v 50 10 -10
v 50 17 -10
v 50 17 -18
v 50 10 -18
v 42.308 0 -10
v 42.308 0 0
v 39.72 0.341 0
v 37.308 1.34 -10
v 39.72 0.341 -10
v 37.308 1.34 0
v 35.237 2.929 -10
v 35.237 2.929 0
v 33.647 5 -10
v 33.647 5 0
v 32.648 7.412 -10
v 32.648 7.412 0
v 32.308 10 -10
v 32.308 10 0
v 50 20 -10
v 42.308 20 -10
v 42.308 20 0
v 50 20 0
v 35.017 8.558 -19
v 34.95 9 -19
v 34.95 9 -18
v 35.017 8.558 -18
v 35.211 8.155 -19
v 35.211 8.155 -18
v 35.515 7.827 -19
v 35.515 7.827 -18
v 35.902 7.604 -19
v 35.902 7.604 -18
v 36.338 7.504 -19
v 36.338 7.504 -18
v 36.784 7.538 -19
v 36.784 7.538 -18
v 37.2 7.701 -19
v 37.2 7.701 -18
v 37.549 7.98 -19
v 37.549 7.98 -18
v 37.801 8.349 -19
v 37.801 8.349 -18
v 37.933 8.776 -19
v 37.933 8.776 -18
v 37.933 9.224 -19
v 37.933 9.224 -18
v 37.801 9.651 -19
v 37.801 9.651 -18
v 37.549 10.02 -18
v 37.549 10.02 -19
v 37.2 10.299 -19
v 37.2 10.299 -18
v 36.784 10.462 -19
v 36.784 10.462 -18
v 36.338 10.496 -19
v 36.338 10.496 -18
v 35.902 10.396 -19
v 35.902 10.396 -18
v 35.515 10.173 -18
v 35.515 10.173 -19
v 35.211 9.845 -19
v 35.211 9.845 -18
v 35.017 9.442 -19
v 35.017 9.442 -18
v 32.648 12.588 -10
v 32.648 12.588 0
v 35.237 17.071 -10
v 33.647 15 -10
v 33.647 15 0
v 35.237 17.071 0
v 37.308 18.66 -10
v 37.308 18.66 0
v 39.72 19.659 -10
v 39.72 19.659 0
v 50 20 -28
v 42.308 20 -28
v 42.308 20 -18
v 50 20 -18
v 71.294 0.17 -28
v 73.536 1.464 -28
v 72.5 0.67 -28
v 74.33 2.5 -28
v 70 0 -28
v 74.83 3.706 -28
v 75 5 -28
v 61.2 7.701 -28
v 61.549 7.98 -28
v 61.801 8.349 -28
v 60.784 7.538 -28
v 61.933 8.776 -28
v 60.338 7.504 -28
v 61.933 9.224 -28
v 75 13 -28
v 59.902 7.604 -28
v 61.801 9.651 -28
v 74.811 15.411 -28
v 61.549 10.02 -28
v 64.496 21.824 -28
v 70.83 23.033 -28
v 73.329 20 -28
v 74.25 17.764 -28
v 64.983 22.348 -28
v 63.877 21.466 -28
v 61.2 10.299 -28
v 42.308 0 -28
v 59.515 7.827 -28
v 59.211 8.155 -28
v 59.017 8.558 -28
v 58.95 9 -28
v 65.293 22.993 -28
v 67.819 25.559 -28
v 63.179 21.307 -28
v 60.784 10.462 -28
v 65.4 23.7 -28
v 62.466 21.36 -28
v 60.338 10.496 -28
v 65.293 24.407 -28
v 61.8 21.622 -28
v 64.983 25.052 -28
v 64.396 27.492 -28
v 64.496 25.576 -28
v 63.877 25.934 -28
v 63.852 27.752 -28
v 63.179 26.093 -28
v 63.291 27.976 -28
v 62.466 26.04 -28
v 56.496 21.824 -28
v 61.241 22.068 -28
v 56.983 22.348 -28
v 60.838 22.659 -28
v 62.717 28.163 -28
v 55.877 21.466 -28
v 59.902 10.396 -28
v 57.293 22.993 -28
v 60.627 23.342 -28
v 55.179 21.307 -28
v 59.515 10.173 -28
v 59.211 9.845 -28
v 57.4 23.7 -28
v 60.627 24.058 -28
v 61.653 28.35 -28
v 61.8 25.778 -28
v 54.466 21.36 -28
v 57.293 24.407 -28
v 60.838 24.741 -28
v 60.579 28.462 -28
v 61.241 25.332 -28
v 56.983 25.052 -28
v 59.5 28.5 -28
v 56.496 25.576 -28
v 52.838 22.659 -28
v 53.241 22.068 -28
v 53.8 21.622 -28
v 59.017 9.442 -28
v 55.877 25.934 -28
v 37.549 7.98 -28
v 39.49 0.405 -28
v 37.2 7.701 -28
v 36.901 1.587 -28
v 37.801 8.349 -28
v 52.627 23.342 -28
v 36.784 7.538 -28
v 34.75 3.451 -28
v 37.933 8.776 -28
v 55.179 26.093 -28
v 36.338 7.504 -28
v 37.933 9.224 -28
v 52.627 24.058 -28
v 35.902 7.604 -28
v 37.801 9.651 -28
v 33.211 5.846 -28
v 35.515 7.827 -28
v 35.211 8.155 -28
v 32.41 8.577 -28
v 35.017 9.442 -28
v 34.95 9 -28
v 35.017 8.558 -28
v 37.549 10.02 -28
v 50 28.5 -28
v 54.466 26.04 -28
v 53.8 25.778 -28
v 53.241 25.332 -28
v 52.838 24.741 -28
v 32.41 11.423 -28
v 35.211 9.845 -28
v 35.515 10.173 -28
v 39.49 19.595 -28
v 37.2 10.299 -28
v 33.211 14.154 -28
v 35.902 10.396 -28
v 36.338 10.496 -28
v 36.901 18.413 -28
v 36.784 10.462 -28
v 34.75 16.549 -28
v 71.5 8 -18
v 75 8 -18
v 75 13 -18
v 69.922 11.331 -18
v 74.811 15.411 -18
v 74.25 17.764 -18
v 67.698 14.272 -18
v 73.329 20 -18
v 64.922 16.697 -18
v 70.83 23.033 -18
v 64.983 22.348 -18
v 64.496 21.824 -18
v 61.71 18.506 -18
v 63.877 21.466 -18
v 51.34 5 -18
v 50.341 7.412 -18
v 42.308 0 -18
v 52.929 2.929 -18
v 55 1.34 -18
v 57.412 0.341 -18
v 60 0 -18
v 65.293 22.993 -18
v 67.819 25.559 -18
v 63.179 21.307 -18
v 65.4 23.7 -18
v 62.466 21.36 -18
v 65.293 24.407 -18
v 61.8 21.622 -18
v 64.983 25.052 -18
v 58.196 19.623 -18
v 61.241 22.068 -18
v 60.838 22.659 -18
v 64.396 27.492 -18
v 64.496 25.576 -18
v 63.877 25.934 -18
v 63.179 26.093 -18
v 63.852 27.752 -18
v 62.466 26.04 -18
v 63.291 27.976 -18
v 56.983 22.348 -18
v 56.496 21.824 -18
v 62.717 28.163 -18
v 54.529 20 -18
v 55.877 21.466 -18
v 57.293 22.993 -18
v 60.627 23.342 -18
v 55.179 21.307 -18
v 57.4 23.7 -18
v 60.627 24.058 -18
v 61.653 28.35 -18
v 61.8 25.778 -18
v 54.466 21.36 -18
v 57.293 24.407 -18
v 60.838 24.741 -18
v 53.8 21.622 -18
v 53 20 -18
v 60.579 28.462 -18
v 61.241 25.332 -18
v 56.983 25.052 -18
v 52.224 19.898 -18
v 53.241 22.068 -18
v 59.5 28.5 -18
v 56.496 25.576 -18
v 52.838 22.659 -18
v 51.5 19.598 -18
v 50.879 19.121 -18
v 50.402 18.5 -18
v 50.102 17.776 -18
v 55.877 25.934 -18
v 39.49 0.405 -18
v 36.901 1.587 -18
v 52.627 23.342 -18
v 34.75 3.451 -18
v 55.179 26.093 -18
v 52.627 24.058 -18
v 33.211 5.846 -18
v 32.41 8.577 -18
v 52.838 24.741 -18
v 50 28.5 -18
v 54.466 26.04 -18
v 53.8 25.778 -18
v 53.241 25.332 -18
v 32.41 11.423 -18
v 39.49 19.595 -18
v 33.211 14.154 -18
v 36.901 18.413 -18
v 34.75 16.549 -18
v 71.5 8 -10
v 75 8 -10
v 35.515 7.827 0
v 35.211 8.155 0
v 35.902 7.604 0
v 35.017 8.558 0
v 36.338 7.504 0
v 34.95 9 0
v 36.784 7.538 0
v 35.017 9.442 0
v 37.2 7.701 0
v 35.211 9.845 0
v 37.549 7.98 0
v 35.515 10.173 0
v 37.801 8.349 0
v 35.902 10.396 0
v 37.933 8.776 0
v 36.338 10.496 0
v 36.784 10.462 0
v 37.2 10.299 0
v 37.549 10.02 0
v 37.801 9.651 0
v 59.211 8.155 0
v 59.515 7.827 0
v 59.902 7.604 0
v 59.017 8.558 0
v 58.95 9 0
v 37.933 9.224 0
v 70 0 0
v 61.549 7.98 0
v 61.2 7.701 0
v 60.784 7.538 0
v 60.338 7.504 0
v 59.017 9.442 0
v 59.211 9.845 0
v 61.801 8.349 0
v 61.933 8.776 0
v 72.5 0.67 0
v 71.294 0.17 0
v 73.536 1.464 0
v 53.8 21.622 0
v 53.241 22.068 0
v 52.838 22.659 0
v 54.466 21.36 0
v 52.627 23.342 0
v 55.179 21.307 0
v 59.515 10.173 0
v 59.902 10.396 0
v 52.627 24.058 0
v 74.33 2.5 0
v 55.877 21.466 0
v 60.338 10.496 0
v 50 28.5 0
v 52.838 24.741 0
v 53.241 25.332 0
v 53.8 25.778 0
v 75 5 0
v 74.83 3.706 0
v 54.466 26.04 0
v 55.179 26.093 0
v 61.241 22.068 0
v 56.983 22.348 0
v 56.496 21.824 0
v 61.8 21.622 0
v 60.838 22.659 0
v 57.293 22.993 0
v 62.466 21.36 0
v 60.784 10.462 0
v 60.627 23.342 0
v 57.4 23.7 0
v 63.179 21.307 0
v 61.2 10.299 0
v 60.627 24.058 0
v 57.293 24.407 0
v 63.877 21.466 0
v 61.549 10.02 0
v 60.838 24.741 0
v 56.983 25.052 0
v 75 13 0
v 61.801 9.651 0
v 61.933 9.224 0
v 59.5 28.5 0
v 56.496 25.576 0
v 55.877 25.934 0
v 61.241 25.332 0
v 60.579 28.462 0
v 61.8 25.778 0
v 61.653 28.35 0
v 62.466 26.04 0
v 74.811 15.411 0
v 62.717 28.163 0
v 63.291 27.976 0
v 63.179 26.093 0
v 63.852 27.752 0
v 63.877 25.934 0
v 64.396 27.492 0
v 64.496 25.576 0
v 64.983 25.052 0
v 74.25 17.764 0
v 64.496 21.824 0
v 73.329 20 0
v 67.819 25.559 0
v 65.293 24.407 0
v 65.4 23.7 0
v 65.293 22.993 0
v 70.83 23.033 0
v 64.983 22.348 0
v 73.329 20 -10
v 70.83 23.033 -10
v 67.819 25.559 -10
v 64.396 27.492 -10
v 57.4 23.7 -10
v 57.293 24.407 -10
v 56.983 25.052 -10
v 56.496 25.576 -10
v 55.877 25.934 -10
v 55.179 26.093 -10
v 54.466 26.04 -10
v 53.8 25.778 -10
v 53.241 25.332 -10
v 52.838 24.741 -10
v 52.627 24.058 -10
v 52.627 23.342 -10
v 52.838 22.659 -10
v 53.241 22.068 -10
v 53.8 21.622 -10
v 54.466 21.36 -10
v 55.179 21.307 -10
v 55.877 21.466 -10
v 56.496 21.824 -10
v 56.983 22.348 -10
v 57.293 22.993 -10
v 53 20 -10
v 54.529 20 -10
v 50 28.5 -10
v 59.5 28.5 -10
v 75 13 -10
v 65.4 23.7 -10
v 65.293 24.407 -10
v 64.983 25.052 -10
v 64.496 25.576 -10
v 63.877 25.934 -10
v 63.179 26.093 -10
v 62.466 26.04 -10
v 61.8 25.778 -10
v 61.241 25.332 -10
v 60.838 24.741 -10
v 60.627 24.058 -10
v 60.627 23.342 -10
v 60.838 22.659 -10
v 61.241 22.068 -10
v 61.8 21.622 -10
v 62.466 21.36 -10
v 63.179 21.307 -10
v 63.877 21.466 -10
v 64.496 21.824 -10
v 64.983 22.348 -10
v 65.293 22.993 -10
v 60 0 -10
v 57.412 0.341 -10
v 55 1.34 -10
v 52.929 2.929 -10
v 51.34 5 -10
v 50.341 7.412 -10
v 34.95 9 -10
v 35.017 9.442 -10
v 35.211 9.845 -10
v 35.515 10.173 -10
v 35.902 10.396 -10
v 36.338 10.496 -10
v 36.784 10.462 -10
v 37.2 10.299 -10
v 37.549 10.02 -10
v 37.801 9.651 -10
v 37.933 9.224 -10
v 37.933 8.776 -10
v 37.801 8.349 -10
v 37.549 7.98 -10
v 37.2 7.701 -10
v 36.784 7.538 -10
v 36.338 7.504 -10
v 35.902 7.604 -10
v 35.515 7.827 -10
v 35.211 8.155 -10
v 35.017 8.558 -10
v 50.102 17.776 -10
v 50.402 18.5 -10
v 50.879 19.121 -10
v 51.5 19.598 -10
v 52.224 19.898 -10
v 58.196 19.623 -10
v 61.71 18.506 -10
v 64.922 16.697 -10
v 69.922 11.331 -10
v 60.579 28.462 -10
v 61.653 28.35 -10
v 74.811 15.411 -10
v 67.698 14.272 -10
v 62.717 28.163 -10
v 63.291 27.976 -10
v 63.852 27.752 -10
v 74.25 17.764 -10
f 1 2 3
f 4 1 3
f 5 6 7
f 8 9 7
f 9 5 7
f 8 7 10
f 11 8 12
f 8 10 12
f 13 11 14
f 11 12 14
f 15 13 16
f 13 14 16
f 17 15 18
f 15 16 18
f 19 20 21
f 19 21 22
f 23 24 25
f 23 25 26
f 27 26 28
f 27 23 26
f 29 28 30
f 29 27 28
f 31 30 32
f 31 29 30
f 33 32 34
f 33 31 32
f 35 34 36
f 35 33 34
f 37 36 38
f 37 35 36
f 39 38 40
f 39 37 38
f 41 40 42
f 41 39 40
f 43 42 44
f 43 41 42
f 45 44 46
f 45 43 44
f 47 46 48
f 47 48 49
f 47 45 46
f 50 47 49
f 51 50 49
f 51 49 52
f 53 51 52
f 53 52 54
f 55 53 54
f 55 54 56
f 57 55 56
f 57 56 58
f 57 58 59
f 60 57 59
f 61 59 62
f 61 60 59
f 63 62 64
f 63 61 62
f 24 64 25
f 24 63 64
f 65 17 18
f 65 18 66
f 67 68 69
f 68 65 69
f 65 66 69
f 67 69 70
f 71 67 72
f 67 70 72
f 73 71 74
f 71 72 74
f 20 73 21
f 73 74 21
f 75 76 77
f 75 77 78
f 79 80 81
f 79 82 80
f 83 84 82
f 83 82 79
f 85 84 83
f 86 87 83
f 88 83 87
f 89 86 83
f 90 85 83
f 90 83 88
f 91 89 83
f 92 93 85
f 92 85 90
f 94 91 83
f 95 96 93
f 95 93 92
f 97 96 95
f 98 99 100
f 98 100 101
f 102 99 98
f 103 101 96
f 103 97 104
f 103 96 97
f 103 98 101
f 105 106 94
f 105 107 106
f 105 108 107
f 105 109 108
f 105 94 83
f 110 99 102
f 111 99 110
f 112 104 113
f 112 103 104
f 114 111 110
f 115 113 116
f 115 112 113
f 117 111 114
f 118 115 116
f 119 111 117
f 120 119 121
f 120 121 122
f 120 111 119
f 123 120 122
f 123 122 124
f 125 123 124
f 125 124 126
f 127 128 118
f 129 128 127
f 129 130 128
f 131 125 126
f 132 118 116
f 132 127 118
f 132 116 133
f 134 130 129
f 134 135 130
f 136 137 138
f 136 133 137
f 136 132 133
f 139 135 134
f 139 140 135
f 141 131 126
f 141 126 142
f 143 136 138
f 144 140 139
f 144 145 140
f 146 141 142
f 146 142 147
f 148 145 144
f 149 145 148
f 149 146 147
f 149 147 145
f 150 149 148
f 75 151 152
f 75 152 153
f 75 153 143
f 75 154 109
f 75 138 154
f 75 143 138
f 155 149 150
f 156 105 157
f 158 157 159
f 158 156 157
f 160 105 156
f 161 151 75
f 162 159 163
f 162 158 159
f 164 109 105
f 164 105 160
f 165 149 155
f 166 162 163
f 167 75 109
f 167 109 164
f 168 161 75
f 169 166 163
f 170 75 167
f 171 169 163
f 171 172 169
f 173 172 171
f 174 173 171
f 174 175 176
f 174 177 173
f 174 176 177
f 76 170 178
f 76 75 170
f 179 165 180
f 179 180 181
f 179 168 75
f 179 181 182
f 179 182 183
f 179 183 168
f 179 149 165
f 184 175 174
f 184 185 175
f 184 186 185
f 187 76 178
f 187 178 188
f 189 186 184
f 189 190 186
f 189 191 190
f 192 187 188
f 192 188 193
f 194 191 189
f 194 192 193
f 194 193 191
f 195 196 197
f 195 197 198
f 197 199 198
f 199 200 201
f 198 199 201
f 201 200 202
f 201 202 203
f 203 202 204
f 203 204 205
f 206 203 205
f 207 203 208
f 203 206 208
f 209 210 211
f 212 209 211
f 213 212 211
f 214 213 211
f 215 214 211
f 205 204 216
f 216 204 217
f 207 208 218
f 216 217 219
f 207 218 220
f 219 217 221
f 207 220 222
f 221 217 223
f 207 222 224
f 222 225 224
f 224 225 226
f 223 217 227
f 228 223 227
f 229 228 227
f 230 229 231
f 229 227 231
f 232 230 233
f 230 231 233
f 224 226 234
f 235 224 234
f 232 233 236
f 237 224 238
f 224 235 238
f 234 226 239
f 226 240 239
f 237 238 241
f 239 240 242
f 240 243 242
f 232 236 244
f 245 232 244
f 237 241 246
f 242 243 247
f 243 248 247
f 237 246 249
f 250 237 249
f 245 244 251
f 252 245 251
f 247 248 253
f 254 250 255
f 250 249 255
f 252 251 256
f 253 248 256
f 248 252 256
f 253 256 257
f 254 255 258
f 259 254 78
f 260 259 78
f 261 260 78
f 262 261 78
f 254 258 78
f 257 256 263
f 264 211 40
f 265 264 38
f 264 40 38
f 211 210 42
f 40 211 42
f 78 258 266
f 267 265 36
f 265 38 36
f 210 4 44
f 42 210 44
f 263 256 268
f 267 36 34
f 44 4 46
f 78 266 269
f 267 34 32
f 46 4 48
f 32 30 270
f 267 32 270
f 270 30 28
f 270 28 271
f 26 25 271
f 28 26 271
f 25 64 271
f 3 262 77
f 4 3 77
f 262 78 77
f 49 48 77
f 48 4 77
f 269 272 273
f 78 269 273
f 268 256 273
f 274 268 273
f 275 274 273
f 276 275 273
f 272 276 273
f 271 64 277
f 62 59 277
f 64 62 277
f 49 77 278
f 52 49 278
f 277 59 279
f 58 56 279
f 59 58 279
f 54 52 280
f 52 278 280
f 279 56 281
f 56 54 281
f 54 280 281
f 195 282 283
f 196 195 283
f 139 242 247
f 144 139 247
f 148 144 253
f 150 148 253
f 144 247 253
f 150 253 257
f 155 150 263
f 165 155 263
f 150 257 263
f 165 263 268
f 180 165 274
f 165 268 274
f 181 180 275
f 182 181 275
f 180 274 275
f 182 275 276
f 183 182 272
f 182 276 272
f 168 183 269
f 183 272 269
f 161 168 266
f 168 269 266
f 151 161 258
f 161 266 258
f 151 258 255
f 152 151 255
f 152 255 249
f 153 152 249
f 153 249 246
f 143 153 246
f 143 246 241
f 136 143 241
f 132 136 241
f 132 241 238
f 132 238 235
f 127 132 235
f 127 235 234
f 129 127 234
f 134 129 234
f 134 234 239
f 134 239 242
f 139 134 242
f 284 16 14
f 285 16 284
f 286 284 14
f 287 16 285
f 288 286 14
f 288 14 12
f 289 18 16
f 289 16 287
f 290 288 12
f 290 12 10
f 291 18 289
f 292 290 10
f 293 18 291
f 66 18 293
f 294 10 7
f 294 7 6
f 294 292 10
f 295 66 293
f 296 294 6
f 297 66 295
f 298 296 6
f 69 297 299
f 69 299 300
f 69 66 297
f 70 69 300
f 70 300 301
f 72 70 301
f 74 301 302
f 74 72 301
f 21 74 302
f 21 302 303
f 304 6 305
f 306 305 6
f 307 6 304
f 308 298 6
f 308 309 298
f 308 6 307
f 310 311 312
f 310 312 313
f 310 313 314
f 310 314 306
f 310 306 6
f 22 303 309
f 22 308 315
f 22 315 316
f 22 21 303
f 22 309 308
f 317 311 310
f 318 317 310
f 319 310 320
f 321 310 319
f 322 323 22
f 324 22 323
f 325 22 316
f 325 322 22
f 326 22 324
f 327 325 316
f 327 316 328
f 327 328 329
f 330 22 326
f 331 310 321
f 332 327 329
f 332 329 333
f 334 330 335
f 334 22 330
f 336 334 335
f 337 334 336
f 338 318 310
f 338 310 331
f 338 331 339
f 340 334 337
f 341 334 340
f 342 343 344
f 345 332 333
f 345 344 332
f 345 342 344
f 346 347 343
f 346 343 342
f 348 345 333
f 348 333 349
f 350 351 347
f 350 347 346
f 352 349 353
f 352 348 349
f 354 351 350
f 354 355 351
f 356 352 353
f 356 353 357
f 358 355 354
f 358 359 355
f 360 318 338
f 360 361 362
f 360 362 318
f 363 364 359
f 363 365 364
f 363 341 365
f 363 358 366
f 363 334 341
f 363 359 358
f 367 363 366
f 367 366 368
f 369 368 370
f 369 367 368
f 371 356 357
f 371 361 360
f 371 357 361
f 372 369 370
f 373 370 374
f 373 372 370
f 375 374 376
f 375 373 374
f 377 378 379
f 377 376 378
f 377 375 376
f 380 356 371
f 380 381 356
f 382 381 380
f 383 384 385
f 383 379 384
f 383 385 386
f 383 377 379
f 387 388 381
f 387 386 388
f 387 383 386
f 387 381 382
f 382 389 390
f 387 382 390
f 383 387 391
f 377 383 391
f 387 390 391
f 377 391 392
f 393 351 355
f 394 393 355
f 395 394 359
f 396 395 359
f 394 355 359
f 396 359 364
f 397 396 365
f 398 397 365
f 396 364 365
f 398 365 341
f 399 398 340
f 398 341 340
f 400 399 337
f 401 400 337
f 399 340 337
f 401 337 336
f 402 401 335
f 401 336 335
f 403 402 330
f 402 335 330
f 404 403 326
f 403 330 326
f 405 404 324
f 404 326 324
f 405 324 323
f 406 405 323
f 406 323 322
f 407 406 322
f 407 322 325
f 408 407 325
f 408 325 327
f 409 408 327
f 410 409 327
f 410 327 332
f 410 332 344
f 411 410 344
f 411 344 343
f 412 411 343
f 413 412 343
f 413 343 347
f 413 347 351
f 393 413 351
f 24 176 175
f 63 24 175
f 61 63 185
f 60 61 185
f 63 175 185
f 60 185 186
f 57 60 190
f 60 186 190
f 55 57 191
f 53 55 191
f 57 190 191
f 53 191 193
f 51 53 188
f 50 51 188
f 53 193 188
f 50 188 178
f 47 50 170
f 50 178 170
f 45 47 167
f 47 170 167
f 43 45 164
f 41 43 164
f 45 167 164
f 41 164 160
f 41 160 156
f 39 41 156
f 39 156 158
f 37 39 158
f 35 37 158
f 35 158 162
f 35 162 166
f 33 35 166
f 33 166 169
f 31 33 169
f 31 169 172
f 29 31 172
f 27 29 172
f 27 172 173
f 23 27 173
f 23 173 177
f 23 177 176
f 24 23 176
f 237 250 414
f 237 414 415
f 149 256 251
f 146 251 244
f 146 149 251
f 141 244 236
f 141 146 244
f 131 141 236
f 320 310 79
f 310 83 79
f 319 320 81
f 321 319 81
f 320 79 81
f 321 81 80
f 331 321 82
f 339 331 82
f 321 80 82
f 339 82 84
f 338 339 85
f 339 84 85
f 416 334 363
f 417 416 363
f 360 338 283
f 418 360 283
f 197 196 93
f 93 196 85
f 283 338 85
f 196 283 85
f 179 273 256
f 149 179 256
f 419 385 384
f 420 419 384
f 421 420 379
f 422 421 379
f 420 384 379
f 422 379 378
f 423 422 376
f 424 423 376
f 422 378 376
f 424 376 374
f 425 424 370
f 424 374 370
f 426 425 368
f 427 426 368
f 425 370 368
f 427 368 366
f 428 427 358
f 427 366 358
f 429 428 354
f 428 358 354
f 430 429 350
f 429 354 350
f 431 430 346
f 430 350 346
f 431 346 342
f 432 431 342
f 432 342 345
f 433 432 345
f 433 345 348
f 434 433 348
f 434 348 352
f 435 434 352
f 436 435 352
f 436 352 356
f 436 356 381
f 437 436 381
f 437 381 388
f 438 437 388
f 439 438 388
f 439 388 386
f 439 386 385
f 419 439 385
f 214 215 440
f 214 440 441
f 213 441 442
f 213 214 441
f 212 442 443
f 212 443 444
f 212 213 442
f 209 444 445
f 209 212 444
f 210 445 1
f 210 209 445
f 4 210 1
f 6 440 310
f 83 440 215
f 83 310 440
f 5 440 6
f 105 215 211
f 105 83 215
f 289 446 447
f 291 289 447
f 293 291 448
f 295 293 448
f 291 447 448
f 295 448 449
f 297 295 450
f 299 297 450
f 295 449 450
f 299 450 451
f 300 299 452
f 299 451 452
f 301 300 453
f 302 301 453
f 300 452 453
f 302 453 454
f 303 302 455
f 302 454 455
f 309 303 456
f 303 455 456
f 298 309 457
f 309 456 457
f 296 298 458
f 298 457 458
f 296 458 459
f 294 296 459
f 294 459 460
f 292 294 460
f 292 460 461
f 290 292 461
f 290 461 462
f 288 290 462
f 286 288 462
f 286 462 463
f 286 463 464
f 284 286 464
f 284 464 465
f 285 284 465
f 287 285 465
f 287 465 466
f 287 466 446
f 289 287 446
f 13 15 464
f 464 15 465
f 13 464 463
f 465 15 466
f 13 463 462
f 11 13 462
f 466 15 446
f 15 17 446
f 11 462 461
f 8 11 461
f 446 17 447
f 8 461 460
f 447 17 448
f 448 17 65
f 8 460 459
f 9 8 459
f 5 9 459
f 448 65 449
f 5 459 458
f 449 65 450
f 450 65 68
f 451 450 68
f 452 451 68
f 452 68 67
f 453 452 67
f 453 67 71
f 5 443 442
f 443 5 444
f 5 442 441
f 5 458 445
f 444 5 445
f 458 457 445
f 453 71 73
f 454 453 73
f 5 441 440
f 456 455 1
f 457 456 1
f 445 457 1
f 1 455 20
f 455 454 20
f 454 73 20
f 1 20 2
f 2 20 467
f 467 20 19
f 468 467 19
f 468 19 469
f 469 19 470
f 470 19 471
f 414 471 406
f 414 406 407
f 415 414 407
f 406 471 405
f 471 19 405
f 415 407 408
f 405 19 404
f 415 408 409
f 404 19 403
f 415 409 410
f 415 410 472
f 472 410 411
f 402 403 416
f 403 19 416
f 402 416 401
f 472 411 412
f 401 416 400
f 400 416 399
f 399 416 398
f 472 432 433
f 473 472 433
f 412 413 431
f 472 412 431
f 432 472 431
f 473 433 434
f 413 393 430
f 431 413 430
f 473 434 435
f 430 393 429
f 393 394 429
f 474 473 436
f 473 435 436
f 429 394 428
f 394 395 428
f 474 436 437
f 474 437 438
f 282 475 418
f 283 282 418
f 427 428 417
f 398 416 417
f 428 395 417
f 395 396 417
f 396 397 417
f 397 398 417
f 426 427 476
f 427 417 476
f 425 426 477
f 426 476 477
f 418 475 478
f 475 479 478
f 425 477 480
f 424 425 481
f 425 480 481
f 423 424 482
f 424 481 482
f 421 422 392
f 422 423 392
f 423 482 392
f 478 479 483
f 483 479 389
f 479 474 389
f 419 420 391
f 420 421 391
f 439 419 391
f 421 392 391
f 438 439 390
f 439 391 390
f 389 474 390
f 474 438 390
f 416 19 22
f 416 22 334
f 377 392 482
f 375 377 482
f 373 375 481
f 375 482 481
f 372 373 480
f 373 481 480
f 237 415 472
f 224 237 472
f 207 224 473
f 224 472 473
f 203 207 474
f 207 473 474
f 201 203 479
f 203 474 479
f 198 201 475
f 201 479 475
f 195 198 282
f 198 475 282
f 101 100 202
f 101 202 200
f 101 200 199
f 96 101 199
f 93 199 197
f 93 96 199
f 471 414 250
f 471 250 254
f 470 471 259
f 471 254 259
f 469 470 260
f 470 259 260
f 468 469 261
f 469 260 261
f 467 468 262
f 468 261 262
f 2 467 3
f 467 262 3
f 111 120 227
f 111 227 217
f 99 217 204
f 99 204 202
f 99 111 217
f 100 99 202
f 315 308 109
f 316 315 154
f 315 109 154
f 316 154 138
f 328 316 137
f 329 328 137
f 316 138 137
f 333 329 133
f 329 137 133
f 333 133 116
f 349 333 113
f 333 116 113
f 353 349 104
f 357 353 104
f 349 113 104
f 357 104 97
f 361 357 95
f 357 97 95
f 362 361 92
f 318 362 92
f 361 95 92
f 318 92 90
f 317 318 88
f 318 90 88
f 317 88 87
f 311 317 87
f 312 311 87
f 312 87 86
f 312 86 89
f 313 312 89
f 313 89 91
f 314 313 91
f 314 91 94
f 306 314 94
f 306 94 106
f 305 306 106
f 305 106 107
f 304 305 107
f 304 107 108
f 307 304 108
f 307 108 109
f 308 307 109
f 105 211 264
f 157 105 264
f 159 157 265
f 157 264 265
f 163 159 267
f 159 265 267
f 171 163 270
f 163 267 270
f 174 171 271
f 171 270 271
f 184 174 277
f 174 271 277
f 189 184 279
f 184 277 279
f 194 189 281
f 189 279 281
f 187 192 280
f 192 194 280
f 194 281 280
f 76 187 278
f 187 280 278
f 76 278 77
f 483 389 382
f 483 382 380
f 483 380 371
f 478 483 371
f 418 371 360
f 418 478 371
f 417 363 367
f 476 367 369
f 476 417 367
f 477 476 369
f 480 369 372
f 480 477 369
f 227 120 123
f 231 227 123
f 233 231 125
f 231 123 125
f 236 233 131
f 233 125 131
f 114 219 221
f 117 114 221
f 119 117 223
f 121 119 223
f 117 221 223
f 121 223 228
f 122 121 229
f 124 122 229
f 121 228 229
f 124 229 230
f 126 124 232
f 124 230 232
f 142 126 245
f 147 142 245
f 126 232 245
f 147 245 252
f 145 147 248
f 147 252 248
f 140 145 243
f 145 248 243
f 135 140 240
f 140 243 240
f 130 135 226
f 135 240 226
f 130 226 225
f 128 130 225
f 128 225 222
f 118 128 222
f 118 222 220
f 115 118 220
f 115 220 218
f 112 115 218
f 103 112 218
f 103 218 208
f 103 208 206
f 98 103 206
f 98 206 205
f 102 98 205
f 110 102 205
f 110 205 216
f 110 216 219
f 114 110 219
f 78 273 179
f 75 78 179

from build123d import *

# Parameters (mm, degrees)
CROQUIS1_W                 = 75
CROQUIS1_H                 = 28
SALIENTE_EXTRUIR2_DEPTH    = 20
CROQUIS2_W                 = 75
CROQUIS2_H                 = 10
SALIENTE_EXTRUIR3_DEPTH    = 8.5
CROQUIS3_R                 = 2.4
CORTAR_EXTRUIR1_DEPTH      = 28
CROQUIS5_W                 = 3.5
CROQUIS5_H                 = 8
CORTAR_EXTRUIR2_DEPTH      = 12
REDONDEO1_R                = 18
CORTAR_EXTRUIR3_DEPTH      = 18.5
CORTAR_EXTRUIR3_DEPTH_BACK = 9.5
CROQUIS7_W                 = 50
CROQUIS7_H                 = 8.5
CROQUIS8_W                 = 50
CROQUIS8_H                 = 9
CORTAR_EXTRUIR4_DEPTH      = 20.5
REDONDEO2_R                = 10
REDONDEO5_R                = 10
CORTAR_EXTRUIR6_DEPTH      = 28.5
CROQUIS10_R                = 1.5
CORTAR_EXTRUIR7_DEPTH      = 85.977938313
REDONDEO6_R                = 10
REDONDEO7_R                = 3
REDONDEO8_R                = 5
CORTAR_EXTRUIR11_DEPTH     = 85.977938313
SALIENTE_EXTRUIR4_DEPTH    = 10
SALIENTE_EXTRUIR5_START    = -10
SALIENTE_EXTRUIR5_DEPTH    = 10
CORTAR_EXTRUIR12_START     = -0.5
CORTAR_EXTRUIR12_DEPTH     = 0.5
CROQUIS20_R                = 1.5
SALIENTE_EXTRUIR7_DEPTH    = 1
CORTAR_EXTRUIR13_DEPTH     = 85.977938313
CORTAR_EXTRUIR14_DEPTH     = 85.977938313
REDONDEO9_R                = 10


with BuildPart() as part:
    # Croquis1 → Saliente-Extruir2 (new body)
    with BuildSketch(Plane(origin=(0, 0, 0), x_dir=(1, 0, 0), z_dir=(0, 1, 0))):
        with Locations((37.5, 14)):
            Rectangle(CROQUIS1_W, CROQUIS1_H)
    extrude(amount=SALIENTE_EXTRUIR2_DEPTH)

    # Croquis2 → Saliente-Extruir3 (add)
    with BuildSketch(Plane(origin=(0, 20, 0), x_dir=(1, 0, 0), z_dir=(0, 1, 0))):
        with Locations((37.5, 5)):
            Rectangle(CROQUIS2_W, CROQUIS2_H)
        with Locations((37.5, 23)):
            Rectangle(CROQUIS2_W, CROQUIS2_H)
    extrude(amount=SALIENTE_EXTRUIR3_DEPTH)

    # Croquis3 → Cortar-Extruir1 (cut)
    with BuildSketch(Plane.XY):
        with Locations((63, 23.7)):
            Circle(CROQUIS3_R)
        with Locations((55, 23.7)):
            Circle(CROQUIS3_R)
    extrude(amount=-CORTAR_EXTRUIR1_DEPTH, mode=Mode.SUBTRACT)

    # Croquis5 → Cortar-Extruir2 (cut)
    with BuildSketch(Plane(origin=(0, 20, 0), x_dir=(1, 0, 0), z_dir=(0, 1, 0))):
        with Locations((73.25, 14)):
            Rectangle(CROQUIS5_W, CROQUIS5_H)
    extrude(amount=-CORTAR_EXTRUIR2_DEPTH, mode=Mode.SUBTRACT)

    # Redondeo1
    # the kernel refuses this fillet: 18 mm, written as the material it takes off along each edge
    with BuildSketch(Plane(origin=(71.5, 20, -10), x_dir=(0, -1, 0), z_dir=(0, 0, -1))) as redondeo1_piece_1:
        with BuildLine():
            CenterArc((18, 16.970562748), REDONDEO1_R, 180, 70.528779366)
            Line((0, 16.970562748), (0, 0))
            Line((0, 0), (12, 0))
        make_face()
    extrude(amount=8, mode=Mode.SUBTRACT)

    # Croquis7 → Cortar-Extruir3 (cut, two sides: drawn at the far end of the back side and taken through both)
    with BuildSketch(Plane.XY.offset(-18).offset(-CORTAR_EXTRUIR3_DEPTH_BACK)):
        with Locations((25, 24.25)):
            Rectangle(CROQUIS7_W, CROQUIS7_H)
    extrude(amount=CORTAR_EXTRUIR3_DEPTH + CORTAR_EXTRUIR3_DEPTH_BACK, mode=Mode.SUBTRACT)

    # Croquis8 → Cortar-Extruir4 (cut)
    with BuildSketch(Plane(origin=(0, 20, 0), x_dir=(1, 0, 0), z_dir=(0, 1, 0))):
        with Locations((25, 14.5)):
            Rectangle(CROQUIS8_W, CROQUIS8_H)
    extrude(amount=-CORTAR_EXTRUIR4_DEPTH, mode=Mode.SUBTRACT)

    # Redondeo2
    redondeo2_edges = [part.edges().sort_by_distance(p)[0] for p in [
        (0, 20, -5),
        (0, 20, -23.25),
    ]]
    fillet(redondeo2_edges, radius=REDONDEO2_R)

    # Redondeo5
    # the kernel refuses this fillet: 10 mm, written as the material it takes off along each edge
    with BuildSketch(Plane(origin=(0, 0, -35), x_dir=(1, 0, 0), z_dir=(0, 0, 1))) as redondeo5_piece_1:
        with BuildLine():
            CenterArc((REDONDEO5_R, REDONDEO5_R), REDONDEO5_R, 180, 90)
            Line((0, REDONDEO5_R), (0, 0))
            Line((0, 0), (REDONDEO5_R, 0))
        make_face()
    extrude(amount=60, mode=Mode.SUBTRACT)

    # Croquis9 → Cortar-Extruir6 (cut)
    with BuildSketch(Plane(origin=(0, 0, -28), x_dir=(-1, 0, 0), z_dir=(0, 0, -1))):
        with BuildLine():
            Line((-75, 28.5), (-59.5, 28.5))
            ThreePointArc((-59.5, 28.5), (-70.460155108, 23.960155108), (-75, 13))
            Line((-75, 13), (-75, 28.5))
        make_face()
    extrude(amount=-CORTAR_EXTRUIR6_DEPTH, mode=Mode.SUBTRACT)

    # Croquis10 → Cortar-Extruir7 (cut, through all)
    with BuildSketch(Plane(origin=(0, 0, -28), x_dir=(-1, 0, 0), z_dir=(0, 0, -1))):
        with Locations((-60.449874371, 9)):
            Circle(CROQUIS10_R)
        with Locations((-36.449874371, 9)):
            Circle(CROQUIS10_R)
        with Locations((-12.449874371, 9)):
            Circle(CROQUIS10_R)
    extrude(amount=-CORTAR_EXTRUIR7_DEPTH, mode=Mode.SUBTRACT)

    # Redondeo6
    redondeo6_edges = [part.edges().sort_by_distance(p)[0] for p in [
        (50, 0, -14.5),
    ]]
    fillet(redondeo6_edges, radius=REDONDEO6_R)

    # Redondeo7
    # the kernel refuses this fillet: 3 mm, written as the material it takes off along each edge
    with BuildSketch(Plane(origin=(50, 20, -18), x_dir=(0, -1, 0), z_dir=(0, 0, 1))) as redondeo7_piece_1:
        with BuildLine():
            CenterArc((REDONDEO7_R, REDONDEO7_R), REDONDEO7_R, 180, 90)
            Line((0, REDONDEO7_R), (0, 0))
            Line((0, 0), (REDONDEO7_R, 0))
        make_face()
    extrude(amount=8, mode=Mode.SUBTRACT)

    # Redondeo8
    redondeo8_edges = [part.edges().sort_by_distance(p)[0] for p in [
        (75, 0, -14),
    ]]
    fillet(redondeo8_edges, radius=REDONDEO8_R)

    # Croquis16 → Cortar-Extruir11 (cut, through all)
    with BuildSketch(Plane(origin=(0, 0, -28), x_dir=(-1, 0, 0), z_dir=(0, 0, -1))):
        with BuildLine():
            Line((-73.329316686, 20), (-69.329316686, 20))
            ThreePointArc((-69.329316686, 20), (-67.304546525, 25.119348054), (-62.716889054, 28.162507207))
            ThreePointArc((-62.716889054, 28.162507207), (-68.949863148, 25.286174608), (-73.329316686, 20))
        make_face()
    extrude(amount=-CORTAR_EXTRUIR11_DEPTH, mode=Mode.SUBTRACT)

    # Croquis17 → Saliente-Extruir4 (add)
    with BuildSketch(Plane(origin=(0, 0, -28), x_dir=(-1, 0, 0), z_dir=(0, 0, -1))):
        with BuildLine():
            Line((-73.329316686, 20), (-69.329316686, 20))
            ThreePointArc((-69.329316686, 20), (-67.839062436, 24.388682638), (-64.39628475, 27.491693244))
            ThreePointArc((-64.39628475, 27.491693244), (-69.382310449, 24.36530565), (-73.329316686, 20))
        make_face()
    extrude(amount=-SALIENTE_EXTRUIR4_DEPTH)

    # Croquis18 → Saliente-Extruir5 (add)
    with BuildSketch(Plane.XY.offset(SALIENTE_EXTRUIR5_START)):
        with BuildLine():
            ThreePointArc((64.39628475, 27.491693244), (67.839062436, 24.388682638), (69.329316686, 20))
            Line((69.329316686, 20), (73.329316686, 20))
            ThreePointArc((73.329316686, 20), (69.382310449, 24.36530565), (64.39628475, 27.491693244))
        make_face()
    extrude(amount=SALIENTE_EXTRUIR5_DEPTH)

    # Croquis19 → Cortar-Extruir12 (cut)
    with BuildSketch(Plane.XY.offset(-27.5).offset(CORTAR_EXTRUIR12_START)):
        with BuildLine():
            Line((50, 20), (50, 28.5))
            Line((50, 28.5), (0, 28.5))
            Line((0, 28.5), (0, 10))
            ThreePointArc((0, 10), (2.928932188, 17.071067812), (10, 20))
            Line((10, 20), (50, 20))
        make_face()
    extrude(amount=CORTAR_EXTRUIR12_DEPTH, mode=Mode.SUBTRACT)

    # Croquis20 → Saliente-Extruir7 (add)
    with BuildSketch(Plane.XY.offset(-19)):
        with BuildLine():
            Line((50, 20), (50, 10))
            ThreePointArc((50, 10), (52.928932188, 2.928932188), (60, 0))
            Line((60, 0), (10, 0))
            ThreePointArc((10, 0), (0, 10), (10, 20))
            Line((10, 20), (50, 20))
        make_face()
        with Locations(Location((12.449874371, 9, 0), (0, 0, 180))):
            Circle(CROQUIS20_R, mode=Mode.SUBTRACT)
        with Locations(Location((36.449874371, 9, 0), (0, 0, 180))):
            Circle(CROQUIS20_R, mode=Mode.SUBTRACT)
    extrude(amount=SALIENTE_EXTRUIR7_DEPTH)

    # Croquis21 → Cortar-Extruir13 (cut, through all)
    with BuildSketch(Plane.XY):
        with BuildLine():
            Line((10, 20), (36.449874371, 20))
            ThreePointArc((36.449874371, 20), (26.449874371, 10), (36.449874371, 0))
            Line((36.449874371, 0), (10, 0))
            ThreePointArc((10, 0), (0, 10), (10, 20))
        make_face()
    extrude(amount=-CORTAR_EXTRUIR13_DEPTH, mode=Mode.SUBTRACT)

    # Croquis22 → Cortar-Extruir14 (cut, through all)
    with BuildSketch(Plane.XY):
        with BuildLine():
            ThreePointArc((36.449874371, 0), (32.307738747, 10), (36.449874371, 20))
            ThreePointArc((36.449874371, 20), (26.449874371, 10), (36.449874371, 0))
        make_face()
    extrude(amount=-CORTAR_EXTRUIR14_DEPTH, mode=Mode.SUBTRACT)

    # Redondeo9
    # the kernel refuses this fillet: 10 mm, written as the material it takes off along each edge
    with BuildSketch(Plane(origin=(36.449874371, 20, 27.059805007), x_dir=(-0.3826834323650891, -0.9238795325112871, 0), z_dir=(0, 0, -1)), Plane(origin=(36.449874371, 20, 9.059805007), x_dir=(-0.3826834323650891, -0.9238795325112871, 0), z_dir=(0, 0, -1))) as redondeo9_piece_1:
        with BuildLine():
            CenterArc((6.997087679, -9.238795325), REDONDEO9_R, 67.5, 90)
            Line((-2.241707646, -5.411961001), (0, 0))
            ThreePointArc((0, 0), (5.411961001, 1.076505975), (10.823922003, 0))
        make_face()
    extrude(amount=64.119610015, mode=Mode.SUBTRACT)
    with BuildSketch(Plane(origin=(36.449874371, 0, 27.059805007), x_dir=(1, 0, 0), z_dir=(0, 0, -1)), Plane(origin=(36.449874371, 0, 9.059805007), x_dir=(1, 0, 0), z_dir=(0, 0, -1))) as redondeo9_piece_2:
        with BuildLine():
            CenterArc((5.857864376, -10), REDONDEO9_R, 90, 90)
            ThreePointArc((-4.142135624, -10), (-3.065629649, -4.588038999), (0, 0))
            Line((0, 0), (5.857864376, 0))
        make_face()
    extrude(amount=64.119610015, mode=Mode.SUBTRACT)


solid = part.part
